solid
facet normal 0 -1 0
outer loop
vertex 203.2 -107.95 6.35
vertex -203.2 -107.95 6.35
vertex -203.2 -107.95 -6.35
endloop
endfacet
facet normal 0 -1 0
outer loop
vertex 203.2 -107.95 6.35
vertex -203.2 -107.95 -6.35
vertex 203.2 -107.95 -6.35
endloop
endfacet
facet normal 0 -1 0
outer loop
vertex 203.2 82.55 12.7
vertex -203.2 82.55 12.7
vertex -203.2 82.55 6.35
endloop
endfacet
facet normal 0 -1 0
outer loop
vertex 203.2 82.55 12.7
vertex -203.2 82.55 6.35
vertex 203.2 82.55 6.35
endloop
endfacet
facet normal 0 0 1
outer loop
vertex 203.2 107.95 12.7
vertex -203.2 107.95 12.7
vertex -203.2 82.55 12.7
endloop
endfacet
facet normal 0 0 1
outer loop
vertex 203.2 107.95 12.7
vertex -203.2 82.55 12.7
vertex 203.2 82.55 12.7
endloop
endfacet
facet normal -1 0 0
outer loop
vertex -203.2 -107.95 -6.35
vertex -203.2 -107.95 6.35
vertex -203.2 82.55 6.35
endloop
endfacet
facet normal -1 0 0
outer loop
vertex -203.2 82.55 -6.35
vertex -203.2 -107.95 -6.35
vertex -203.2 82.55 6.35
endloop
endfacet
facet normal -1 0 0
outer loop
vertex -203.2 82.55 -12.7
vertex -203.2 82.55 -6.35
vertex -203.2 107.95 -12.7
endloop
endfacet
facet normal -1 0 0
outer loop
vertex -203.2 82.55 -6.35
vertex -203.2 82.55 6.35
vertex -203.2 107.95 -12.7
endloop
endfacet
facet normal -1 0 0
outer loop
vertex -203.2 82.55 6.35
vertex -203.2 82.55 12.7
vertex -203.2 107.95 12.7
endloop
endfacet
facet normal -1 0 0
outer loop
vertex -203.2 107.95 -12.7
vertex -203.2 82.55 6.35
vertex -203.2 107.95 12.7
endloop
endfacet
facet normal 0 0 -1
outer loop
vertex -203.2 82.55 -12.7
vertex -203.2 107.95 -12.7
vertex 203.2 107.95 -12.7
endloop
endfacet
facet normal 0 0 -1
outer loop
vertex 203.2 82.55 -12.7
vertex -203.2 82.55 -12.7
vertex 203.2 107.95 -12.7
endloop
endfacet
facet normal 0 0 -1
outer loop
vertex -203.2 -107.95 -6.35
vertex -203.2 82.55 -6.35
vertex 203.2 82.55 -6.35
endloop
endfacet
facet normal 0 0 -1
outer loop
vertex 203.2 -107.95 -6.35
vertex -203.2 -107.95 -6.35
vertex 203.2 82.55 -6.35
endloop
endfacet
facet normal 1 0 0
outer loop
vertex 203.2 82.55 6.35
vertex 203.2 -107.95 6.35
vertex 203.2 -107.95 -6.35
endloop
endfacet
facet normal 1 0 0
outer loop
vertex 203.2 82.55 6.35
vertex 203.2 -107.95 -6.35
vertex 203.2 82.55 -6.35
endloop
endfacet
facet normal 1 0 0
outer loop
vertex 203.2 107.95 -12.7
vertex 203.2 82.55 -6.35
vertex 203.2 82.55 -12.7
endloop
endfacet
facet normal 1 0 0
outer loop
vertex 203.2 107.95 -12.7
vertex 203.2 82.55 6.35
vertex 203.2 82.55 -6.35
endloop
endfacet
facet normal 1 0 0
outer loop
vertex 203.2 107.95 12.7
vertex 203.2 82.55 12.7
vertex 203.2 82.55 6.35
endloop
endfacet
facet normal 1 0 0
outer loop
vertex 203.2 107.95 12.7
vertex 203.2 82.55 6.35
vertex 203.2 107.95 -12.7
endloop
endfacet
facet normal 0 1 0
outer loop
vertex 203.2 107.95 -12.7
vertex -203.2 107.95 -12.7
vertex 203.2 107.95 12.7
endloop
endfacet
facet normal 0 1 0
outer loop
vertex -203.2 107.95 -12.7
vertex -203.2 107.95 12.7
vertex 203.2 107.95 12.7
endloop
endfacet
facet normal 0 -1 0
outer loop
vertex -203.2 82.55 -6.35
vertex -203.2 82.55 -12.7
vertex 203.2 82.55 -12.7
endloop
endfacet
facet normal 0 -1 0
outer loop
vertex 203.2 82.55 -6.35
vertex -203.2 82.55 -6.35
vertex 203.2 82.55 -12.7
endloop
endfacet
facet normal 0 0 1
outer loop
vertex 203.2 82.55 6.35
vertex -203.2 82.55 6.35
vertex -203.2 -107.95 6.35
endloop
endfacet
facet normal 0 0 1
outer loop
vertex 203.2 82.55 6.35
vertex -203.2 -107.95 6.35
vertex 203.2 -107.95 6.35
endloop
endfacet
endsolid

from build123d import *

# Parameters (mm, degrees)
SKETCH1_W           = 406.4
SKETCH1_H           = 215.9
BOSS_EXTRUDE1_DEPTH = 12.7
SKETCH3_W           = 406.4
SKETCH3_H           = 190.5
CUT_EXTRUDE1_DEPTH  = 6.35


with BuildPart() as part:
    # Sketch1 → Boss-Extrude1 (new, symmetric)
    with BuildSketch(Plane.XY):
        Rectangle(SKETCH1_W, SKETCH1_H)
    extrude(amount=BOSS_EXTRUDE1_DEPTH, both=True)

    # Sketch3 → Cut-Extrude1 (cut)
    with BuildSketch(Plane.XY.offset(12.7)):
        with Locations((0, -12.7)):
            Rectangle(SKETCH3_W, SKETCH3_H)
    cut_extrude1 = extrude(amount=-CUT_EXTRUDE1_DEPTH, mode=Mode.SUBTRACT)

    # Mirror1: Cut-Extrude1 across plane
    add(cut_extrude1.mirror(Plane.XY), mode=Mode.SUBTRACT)


solid = part.part
